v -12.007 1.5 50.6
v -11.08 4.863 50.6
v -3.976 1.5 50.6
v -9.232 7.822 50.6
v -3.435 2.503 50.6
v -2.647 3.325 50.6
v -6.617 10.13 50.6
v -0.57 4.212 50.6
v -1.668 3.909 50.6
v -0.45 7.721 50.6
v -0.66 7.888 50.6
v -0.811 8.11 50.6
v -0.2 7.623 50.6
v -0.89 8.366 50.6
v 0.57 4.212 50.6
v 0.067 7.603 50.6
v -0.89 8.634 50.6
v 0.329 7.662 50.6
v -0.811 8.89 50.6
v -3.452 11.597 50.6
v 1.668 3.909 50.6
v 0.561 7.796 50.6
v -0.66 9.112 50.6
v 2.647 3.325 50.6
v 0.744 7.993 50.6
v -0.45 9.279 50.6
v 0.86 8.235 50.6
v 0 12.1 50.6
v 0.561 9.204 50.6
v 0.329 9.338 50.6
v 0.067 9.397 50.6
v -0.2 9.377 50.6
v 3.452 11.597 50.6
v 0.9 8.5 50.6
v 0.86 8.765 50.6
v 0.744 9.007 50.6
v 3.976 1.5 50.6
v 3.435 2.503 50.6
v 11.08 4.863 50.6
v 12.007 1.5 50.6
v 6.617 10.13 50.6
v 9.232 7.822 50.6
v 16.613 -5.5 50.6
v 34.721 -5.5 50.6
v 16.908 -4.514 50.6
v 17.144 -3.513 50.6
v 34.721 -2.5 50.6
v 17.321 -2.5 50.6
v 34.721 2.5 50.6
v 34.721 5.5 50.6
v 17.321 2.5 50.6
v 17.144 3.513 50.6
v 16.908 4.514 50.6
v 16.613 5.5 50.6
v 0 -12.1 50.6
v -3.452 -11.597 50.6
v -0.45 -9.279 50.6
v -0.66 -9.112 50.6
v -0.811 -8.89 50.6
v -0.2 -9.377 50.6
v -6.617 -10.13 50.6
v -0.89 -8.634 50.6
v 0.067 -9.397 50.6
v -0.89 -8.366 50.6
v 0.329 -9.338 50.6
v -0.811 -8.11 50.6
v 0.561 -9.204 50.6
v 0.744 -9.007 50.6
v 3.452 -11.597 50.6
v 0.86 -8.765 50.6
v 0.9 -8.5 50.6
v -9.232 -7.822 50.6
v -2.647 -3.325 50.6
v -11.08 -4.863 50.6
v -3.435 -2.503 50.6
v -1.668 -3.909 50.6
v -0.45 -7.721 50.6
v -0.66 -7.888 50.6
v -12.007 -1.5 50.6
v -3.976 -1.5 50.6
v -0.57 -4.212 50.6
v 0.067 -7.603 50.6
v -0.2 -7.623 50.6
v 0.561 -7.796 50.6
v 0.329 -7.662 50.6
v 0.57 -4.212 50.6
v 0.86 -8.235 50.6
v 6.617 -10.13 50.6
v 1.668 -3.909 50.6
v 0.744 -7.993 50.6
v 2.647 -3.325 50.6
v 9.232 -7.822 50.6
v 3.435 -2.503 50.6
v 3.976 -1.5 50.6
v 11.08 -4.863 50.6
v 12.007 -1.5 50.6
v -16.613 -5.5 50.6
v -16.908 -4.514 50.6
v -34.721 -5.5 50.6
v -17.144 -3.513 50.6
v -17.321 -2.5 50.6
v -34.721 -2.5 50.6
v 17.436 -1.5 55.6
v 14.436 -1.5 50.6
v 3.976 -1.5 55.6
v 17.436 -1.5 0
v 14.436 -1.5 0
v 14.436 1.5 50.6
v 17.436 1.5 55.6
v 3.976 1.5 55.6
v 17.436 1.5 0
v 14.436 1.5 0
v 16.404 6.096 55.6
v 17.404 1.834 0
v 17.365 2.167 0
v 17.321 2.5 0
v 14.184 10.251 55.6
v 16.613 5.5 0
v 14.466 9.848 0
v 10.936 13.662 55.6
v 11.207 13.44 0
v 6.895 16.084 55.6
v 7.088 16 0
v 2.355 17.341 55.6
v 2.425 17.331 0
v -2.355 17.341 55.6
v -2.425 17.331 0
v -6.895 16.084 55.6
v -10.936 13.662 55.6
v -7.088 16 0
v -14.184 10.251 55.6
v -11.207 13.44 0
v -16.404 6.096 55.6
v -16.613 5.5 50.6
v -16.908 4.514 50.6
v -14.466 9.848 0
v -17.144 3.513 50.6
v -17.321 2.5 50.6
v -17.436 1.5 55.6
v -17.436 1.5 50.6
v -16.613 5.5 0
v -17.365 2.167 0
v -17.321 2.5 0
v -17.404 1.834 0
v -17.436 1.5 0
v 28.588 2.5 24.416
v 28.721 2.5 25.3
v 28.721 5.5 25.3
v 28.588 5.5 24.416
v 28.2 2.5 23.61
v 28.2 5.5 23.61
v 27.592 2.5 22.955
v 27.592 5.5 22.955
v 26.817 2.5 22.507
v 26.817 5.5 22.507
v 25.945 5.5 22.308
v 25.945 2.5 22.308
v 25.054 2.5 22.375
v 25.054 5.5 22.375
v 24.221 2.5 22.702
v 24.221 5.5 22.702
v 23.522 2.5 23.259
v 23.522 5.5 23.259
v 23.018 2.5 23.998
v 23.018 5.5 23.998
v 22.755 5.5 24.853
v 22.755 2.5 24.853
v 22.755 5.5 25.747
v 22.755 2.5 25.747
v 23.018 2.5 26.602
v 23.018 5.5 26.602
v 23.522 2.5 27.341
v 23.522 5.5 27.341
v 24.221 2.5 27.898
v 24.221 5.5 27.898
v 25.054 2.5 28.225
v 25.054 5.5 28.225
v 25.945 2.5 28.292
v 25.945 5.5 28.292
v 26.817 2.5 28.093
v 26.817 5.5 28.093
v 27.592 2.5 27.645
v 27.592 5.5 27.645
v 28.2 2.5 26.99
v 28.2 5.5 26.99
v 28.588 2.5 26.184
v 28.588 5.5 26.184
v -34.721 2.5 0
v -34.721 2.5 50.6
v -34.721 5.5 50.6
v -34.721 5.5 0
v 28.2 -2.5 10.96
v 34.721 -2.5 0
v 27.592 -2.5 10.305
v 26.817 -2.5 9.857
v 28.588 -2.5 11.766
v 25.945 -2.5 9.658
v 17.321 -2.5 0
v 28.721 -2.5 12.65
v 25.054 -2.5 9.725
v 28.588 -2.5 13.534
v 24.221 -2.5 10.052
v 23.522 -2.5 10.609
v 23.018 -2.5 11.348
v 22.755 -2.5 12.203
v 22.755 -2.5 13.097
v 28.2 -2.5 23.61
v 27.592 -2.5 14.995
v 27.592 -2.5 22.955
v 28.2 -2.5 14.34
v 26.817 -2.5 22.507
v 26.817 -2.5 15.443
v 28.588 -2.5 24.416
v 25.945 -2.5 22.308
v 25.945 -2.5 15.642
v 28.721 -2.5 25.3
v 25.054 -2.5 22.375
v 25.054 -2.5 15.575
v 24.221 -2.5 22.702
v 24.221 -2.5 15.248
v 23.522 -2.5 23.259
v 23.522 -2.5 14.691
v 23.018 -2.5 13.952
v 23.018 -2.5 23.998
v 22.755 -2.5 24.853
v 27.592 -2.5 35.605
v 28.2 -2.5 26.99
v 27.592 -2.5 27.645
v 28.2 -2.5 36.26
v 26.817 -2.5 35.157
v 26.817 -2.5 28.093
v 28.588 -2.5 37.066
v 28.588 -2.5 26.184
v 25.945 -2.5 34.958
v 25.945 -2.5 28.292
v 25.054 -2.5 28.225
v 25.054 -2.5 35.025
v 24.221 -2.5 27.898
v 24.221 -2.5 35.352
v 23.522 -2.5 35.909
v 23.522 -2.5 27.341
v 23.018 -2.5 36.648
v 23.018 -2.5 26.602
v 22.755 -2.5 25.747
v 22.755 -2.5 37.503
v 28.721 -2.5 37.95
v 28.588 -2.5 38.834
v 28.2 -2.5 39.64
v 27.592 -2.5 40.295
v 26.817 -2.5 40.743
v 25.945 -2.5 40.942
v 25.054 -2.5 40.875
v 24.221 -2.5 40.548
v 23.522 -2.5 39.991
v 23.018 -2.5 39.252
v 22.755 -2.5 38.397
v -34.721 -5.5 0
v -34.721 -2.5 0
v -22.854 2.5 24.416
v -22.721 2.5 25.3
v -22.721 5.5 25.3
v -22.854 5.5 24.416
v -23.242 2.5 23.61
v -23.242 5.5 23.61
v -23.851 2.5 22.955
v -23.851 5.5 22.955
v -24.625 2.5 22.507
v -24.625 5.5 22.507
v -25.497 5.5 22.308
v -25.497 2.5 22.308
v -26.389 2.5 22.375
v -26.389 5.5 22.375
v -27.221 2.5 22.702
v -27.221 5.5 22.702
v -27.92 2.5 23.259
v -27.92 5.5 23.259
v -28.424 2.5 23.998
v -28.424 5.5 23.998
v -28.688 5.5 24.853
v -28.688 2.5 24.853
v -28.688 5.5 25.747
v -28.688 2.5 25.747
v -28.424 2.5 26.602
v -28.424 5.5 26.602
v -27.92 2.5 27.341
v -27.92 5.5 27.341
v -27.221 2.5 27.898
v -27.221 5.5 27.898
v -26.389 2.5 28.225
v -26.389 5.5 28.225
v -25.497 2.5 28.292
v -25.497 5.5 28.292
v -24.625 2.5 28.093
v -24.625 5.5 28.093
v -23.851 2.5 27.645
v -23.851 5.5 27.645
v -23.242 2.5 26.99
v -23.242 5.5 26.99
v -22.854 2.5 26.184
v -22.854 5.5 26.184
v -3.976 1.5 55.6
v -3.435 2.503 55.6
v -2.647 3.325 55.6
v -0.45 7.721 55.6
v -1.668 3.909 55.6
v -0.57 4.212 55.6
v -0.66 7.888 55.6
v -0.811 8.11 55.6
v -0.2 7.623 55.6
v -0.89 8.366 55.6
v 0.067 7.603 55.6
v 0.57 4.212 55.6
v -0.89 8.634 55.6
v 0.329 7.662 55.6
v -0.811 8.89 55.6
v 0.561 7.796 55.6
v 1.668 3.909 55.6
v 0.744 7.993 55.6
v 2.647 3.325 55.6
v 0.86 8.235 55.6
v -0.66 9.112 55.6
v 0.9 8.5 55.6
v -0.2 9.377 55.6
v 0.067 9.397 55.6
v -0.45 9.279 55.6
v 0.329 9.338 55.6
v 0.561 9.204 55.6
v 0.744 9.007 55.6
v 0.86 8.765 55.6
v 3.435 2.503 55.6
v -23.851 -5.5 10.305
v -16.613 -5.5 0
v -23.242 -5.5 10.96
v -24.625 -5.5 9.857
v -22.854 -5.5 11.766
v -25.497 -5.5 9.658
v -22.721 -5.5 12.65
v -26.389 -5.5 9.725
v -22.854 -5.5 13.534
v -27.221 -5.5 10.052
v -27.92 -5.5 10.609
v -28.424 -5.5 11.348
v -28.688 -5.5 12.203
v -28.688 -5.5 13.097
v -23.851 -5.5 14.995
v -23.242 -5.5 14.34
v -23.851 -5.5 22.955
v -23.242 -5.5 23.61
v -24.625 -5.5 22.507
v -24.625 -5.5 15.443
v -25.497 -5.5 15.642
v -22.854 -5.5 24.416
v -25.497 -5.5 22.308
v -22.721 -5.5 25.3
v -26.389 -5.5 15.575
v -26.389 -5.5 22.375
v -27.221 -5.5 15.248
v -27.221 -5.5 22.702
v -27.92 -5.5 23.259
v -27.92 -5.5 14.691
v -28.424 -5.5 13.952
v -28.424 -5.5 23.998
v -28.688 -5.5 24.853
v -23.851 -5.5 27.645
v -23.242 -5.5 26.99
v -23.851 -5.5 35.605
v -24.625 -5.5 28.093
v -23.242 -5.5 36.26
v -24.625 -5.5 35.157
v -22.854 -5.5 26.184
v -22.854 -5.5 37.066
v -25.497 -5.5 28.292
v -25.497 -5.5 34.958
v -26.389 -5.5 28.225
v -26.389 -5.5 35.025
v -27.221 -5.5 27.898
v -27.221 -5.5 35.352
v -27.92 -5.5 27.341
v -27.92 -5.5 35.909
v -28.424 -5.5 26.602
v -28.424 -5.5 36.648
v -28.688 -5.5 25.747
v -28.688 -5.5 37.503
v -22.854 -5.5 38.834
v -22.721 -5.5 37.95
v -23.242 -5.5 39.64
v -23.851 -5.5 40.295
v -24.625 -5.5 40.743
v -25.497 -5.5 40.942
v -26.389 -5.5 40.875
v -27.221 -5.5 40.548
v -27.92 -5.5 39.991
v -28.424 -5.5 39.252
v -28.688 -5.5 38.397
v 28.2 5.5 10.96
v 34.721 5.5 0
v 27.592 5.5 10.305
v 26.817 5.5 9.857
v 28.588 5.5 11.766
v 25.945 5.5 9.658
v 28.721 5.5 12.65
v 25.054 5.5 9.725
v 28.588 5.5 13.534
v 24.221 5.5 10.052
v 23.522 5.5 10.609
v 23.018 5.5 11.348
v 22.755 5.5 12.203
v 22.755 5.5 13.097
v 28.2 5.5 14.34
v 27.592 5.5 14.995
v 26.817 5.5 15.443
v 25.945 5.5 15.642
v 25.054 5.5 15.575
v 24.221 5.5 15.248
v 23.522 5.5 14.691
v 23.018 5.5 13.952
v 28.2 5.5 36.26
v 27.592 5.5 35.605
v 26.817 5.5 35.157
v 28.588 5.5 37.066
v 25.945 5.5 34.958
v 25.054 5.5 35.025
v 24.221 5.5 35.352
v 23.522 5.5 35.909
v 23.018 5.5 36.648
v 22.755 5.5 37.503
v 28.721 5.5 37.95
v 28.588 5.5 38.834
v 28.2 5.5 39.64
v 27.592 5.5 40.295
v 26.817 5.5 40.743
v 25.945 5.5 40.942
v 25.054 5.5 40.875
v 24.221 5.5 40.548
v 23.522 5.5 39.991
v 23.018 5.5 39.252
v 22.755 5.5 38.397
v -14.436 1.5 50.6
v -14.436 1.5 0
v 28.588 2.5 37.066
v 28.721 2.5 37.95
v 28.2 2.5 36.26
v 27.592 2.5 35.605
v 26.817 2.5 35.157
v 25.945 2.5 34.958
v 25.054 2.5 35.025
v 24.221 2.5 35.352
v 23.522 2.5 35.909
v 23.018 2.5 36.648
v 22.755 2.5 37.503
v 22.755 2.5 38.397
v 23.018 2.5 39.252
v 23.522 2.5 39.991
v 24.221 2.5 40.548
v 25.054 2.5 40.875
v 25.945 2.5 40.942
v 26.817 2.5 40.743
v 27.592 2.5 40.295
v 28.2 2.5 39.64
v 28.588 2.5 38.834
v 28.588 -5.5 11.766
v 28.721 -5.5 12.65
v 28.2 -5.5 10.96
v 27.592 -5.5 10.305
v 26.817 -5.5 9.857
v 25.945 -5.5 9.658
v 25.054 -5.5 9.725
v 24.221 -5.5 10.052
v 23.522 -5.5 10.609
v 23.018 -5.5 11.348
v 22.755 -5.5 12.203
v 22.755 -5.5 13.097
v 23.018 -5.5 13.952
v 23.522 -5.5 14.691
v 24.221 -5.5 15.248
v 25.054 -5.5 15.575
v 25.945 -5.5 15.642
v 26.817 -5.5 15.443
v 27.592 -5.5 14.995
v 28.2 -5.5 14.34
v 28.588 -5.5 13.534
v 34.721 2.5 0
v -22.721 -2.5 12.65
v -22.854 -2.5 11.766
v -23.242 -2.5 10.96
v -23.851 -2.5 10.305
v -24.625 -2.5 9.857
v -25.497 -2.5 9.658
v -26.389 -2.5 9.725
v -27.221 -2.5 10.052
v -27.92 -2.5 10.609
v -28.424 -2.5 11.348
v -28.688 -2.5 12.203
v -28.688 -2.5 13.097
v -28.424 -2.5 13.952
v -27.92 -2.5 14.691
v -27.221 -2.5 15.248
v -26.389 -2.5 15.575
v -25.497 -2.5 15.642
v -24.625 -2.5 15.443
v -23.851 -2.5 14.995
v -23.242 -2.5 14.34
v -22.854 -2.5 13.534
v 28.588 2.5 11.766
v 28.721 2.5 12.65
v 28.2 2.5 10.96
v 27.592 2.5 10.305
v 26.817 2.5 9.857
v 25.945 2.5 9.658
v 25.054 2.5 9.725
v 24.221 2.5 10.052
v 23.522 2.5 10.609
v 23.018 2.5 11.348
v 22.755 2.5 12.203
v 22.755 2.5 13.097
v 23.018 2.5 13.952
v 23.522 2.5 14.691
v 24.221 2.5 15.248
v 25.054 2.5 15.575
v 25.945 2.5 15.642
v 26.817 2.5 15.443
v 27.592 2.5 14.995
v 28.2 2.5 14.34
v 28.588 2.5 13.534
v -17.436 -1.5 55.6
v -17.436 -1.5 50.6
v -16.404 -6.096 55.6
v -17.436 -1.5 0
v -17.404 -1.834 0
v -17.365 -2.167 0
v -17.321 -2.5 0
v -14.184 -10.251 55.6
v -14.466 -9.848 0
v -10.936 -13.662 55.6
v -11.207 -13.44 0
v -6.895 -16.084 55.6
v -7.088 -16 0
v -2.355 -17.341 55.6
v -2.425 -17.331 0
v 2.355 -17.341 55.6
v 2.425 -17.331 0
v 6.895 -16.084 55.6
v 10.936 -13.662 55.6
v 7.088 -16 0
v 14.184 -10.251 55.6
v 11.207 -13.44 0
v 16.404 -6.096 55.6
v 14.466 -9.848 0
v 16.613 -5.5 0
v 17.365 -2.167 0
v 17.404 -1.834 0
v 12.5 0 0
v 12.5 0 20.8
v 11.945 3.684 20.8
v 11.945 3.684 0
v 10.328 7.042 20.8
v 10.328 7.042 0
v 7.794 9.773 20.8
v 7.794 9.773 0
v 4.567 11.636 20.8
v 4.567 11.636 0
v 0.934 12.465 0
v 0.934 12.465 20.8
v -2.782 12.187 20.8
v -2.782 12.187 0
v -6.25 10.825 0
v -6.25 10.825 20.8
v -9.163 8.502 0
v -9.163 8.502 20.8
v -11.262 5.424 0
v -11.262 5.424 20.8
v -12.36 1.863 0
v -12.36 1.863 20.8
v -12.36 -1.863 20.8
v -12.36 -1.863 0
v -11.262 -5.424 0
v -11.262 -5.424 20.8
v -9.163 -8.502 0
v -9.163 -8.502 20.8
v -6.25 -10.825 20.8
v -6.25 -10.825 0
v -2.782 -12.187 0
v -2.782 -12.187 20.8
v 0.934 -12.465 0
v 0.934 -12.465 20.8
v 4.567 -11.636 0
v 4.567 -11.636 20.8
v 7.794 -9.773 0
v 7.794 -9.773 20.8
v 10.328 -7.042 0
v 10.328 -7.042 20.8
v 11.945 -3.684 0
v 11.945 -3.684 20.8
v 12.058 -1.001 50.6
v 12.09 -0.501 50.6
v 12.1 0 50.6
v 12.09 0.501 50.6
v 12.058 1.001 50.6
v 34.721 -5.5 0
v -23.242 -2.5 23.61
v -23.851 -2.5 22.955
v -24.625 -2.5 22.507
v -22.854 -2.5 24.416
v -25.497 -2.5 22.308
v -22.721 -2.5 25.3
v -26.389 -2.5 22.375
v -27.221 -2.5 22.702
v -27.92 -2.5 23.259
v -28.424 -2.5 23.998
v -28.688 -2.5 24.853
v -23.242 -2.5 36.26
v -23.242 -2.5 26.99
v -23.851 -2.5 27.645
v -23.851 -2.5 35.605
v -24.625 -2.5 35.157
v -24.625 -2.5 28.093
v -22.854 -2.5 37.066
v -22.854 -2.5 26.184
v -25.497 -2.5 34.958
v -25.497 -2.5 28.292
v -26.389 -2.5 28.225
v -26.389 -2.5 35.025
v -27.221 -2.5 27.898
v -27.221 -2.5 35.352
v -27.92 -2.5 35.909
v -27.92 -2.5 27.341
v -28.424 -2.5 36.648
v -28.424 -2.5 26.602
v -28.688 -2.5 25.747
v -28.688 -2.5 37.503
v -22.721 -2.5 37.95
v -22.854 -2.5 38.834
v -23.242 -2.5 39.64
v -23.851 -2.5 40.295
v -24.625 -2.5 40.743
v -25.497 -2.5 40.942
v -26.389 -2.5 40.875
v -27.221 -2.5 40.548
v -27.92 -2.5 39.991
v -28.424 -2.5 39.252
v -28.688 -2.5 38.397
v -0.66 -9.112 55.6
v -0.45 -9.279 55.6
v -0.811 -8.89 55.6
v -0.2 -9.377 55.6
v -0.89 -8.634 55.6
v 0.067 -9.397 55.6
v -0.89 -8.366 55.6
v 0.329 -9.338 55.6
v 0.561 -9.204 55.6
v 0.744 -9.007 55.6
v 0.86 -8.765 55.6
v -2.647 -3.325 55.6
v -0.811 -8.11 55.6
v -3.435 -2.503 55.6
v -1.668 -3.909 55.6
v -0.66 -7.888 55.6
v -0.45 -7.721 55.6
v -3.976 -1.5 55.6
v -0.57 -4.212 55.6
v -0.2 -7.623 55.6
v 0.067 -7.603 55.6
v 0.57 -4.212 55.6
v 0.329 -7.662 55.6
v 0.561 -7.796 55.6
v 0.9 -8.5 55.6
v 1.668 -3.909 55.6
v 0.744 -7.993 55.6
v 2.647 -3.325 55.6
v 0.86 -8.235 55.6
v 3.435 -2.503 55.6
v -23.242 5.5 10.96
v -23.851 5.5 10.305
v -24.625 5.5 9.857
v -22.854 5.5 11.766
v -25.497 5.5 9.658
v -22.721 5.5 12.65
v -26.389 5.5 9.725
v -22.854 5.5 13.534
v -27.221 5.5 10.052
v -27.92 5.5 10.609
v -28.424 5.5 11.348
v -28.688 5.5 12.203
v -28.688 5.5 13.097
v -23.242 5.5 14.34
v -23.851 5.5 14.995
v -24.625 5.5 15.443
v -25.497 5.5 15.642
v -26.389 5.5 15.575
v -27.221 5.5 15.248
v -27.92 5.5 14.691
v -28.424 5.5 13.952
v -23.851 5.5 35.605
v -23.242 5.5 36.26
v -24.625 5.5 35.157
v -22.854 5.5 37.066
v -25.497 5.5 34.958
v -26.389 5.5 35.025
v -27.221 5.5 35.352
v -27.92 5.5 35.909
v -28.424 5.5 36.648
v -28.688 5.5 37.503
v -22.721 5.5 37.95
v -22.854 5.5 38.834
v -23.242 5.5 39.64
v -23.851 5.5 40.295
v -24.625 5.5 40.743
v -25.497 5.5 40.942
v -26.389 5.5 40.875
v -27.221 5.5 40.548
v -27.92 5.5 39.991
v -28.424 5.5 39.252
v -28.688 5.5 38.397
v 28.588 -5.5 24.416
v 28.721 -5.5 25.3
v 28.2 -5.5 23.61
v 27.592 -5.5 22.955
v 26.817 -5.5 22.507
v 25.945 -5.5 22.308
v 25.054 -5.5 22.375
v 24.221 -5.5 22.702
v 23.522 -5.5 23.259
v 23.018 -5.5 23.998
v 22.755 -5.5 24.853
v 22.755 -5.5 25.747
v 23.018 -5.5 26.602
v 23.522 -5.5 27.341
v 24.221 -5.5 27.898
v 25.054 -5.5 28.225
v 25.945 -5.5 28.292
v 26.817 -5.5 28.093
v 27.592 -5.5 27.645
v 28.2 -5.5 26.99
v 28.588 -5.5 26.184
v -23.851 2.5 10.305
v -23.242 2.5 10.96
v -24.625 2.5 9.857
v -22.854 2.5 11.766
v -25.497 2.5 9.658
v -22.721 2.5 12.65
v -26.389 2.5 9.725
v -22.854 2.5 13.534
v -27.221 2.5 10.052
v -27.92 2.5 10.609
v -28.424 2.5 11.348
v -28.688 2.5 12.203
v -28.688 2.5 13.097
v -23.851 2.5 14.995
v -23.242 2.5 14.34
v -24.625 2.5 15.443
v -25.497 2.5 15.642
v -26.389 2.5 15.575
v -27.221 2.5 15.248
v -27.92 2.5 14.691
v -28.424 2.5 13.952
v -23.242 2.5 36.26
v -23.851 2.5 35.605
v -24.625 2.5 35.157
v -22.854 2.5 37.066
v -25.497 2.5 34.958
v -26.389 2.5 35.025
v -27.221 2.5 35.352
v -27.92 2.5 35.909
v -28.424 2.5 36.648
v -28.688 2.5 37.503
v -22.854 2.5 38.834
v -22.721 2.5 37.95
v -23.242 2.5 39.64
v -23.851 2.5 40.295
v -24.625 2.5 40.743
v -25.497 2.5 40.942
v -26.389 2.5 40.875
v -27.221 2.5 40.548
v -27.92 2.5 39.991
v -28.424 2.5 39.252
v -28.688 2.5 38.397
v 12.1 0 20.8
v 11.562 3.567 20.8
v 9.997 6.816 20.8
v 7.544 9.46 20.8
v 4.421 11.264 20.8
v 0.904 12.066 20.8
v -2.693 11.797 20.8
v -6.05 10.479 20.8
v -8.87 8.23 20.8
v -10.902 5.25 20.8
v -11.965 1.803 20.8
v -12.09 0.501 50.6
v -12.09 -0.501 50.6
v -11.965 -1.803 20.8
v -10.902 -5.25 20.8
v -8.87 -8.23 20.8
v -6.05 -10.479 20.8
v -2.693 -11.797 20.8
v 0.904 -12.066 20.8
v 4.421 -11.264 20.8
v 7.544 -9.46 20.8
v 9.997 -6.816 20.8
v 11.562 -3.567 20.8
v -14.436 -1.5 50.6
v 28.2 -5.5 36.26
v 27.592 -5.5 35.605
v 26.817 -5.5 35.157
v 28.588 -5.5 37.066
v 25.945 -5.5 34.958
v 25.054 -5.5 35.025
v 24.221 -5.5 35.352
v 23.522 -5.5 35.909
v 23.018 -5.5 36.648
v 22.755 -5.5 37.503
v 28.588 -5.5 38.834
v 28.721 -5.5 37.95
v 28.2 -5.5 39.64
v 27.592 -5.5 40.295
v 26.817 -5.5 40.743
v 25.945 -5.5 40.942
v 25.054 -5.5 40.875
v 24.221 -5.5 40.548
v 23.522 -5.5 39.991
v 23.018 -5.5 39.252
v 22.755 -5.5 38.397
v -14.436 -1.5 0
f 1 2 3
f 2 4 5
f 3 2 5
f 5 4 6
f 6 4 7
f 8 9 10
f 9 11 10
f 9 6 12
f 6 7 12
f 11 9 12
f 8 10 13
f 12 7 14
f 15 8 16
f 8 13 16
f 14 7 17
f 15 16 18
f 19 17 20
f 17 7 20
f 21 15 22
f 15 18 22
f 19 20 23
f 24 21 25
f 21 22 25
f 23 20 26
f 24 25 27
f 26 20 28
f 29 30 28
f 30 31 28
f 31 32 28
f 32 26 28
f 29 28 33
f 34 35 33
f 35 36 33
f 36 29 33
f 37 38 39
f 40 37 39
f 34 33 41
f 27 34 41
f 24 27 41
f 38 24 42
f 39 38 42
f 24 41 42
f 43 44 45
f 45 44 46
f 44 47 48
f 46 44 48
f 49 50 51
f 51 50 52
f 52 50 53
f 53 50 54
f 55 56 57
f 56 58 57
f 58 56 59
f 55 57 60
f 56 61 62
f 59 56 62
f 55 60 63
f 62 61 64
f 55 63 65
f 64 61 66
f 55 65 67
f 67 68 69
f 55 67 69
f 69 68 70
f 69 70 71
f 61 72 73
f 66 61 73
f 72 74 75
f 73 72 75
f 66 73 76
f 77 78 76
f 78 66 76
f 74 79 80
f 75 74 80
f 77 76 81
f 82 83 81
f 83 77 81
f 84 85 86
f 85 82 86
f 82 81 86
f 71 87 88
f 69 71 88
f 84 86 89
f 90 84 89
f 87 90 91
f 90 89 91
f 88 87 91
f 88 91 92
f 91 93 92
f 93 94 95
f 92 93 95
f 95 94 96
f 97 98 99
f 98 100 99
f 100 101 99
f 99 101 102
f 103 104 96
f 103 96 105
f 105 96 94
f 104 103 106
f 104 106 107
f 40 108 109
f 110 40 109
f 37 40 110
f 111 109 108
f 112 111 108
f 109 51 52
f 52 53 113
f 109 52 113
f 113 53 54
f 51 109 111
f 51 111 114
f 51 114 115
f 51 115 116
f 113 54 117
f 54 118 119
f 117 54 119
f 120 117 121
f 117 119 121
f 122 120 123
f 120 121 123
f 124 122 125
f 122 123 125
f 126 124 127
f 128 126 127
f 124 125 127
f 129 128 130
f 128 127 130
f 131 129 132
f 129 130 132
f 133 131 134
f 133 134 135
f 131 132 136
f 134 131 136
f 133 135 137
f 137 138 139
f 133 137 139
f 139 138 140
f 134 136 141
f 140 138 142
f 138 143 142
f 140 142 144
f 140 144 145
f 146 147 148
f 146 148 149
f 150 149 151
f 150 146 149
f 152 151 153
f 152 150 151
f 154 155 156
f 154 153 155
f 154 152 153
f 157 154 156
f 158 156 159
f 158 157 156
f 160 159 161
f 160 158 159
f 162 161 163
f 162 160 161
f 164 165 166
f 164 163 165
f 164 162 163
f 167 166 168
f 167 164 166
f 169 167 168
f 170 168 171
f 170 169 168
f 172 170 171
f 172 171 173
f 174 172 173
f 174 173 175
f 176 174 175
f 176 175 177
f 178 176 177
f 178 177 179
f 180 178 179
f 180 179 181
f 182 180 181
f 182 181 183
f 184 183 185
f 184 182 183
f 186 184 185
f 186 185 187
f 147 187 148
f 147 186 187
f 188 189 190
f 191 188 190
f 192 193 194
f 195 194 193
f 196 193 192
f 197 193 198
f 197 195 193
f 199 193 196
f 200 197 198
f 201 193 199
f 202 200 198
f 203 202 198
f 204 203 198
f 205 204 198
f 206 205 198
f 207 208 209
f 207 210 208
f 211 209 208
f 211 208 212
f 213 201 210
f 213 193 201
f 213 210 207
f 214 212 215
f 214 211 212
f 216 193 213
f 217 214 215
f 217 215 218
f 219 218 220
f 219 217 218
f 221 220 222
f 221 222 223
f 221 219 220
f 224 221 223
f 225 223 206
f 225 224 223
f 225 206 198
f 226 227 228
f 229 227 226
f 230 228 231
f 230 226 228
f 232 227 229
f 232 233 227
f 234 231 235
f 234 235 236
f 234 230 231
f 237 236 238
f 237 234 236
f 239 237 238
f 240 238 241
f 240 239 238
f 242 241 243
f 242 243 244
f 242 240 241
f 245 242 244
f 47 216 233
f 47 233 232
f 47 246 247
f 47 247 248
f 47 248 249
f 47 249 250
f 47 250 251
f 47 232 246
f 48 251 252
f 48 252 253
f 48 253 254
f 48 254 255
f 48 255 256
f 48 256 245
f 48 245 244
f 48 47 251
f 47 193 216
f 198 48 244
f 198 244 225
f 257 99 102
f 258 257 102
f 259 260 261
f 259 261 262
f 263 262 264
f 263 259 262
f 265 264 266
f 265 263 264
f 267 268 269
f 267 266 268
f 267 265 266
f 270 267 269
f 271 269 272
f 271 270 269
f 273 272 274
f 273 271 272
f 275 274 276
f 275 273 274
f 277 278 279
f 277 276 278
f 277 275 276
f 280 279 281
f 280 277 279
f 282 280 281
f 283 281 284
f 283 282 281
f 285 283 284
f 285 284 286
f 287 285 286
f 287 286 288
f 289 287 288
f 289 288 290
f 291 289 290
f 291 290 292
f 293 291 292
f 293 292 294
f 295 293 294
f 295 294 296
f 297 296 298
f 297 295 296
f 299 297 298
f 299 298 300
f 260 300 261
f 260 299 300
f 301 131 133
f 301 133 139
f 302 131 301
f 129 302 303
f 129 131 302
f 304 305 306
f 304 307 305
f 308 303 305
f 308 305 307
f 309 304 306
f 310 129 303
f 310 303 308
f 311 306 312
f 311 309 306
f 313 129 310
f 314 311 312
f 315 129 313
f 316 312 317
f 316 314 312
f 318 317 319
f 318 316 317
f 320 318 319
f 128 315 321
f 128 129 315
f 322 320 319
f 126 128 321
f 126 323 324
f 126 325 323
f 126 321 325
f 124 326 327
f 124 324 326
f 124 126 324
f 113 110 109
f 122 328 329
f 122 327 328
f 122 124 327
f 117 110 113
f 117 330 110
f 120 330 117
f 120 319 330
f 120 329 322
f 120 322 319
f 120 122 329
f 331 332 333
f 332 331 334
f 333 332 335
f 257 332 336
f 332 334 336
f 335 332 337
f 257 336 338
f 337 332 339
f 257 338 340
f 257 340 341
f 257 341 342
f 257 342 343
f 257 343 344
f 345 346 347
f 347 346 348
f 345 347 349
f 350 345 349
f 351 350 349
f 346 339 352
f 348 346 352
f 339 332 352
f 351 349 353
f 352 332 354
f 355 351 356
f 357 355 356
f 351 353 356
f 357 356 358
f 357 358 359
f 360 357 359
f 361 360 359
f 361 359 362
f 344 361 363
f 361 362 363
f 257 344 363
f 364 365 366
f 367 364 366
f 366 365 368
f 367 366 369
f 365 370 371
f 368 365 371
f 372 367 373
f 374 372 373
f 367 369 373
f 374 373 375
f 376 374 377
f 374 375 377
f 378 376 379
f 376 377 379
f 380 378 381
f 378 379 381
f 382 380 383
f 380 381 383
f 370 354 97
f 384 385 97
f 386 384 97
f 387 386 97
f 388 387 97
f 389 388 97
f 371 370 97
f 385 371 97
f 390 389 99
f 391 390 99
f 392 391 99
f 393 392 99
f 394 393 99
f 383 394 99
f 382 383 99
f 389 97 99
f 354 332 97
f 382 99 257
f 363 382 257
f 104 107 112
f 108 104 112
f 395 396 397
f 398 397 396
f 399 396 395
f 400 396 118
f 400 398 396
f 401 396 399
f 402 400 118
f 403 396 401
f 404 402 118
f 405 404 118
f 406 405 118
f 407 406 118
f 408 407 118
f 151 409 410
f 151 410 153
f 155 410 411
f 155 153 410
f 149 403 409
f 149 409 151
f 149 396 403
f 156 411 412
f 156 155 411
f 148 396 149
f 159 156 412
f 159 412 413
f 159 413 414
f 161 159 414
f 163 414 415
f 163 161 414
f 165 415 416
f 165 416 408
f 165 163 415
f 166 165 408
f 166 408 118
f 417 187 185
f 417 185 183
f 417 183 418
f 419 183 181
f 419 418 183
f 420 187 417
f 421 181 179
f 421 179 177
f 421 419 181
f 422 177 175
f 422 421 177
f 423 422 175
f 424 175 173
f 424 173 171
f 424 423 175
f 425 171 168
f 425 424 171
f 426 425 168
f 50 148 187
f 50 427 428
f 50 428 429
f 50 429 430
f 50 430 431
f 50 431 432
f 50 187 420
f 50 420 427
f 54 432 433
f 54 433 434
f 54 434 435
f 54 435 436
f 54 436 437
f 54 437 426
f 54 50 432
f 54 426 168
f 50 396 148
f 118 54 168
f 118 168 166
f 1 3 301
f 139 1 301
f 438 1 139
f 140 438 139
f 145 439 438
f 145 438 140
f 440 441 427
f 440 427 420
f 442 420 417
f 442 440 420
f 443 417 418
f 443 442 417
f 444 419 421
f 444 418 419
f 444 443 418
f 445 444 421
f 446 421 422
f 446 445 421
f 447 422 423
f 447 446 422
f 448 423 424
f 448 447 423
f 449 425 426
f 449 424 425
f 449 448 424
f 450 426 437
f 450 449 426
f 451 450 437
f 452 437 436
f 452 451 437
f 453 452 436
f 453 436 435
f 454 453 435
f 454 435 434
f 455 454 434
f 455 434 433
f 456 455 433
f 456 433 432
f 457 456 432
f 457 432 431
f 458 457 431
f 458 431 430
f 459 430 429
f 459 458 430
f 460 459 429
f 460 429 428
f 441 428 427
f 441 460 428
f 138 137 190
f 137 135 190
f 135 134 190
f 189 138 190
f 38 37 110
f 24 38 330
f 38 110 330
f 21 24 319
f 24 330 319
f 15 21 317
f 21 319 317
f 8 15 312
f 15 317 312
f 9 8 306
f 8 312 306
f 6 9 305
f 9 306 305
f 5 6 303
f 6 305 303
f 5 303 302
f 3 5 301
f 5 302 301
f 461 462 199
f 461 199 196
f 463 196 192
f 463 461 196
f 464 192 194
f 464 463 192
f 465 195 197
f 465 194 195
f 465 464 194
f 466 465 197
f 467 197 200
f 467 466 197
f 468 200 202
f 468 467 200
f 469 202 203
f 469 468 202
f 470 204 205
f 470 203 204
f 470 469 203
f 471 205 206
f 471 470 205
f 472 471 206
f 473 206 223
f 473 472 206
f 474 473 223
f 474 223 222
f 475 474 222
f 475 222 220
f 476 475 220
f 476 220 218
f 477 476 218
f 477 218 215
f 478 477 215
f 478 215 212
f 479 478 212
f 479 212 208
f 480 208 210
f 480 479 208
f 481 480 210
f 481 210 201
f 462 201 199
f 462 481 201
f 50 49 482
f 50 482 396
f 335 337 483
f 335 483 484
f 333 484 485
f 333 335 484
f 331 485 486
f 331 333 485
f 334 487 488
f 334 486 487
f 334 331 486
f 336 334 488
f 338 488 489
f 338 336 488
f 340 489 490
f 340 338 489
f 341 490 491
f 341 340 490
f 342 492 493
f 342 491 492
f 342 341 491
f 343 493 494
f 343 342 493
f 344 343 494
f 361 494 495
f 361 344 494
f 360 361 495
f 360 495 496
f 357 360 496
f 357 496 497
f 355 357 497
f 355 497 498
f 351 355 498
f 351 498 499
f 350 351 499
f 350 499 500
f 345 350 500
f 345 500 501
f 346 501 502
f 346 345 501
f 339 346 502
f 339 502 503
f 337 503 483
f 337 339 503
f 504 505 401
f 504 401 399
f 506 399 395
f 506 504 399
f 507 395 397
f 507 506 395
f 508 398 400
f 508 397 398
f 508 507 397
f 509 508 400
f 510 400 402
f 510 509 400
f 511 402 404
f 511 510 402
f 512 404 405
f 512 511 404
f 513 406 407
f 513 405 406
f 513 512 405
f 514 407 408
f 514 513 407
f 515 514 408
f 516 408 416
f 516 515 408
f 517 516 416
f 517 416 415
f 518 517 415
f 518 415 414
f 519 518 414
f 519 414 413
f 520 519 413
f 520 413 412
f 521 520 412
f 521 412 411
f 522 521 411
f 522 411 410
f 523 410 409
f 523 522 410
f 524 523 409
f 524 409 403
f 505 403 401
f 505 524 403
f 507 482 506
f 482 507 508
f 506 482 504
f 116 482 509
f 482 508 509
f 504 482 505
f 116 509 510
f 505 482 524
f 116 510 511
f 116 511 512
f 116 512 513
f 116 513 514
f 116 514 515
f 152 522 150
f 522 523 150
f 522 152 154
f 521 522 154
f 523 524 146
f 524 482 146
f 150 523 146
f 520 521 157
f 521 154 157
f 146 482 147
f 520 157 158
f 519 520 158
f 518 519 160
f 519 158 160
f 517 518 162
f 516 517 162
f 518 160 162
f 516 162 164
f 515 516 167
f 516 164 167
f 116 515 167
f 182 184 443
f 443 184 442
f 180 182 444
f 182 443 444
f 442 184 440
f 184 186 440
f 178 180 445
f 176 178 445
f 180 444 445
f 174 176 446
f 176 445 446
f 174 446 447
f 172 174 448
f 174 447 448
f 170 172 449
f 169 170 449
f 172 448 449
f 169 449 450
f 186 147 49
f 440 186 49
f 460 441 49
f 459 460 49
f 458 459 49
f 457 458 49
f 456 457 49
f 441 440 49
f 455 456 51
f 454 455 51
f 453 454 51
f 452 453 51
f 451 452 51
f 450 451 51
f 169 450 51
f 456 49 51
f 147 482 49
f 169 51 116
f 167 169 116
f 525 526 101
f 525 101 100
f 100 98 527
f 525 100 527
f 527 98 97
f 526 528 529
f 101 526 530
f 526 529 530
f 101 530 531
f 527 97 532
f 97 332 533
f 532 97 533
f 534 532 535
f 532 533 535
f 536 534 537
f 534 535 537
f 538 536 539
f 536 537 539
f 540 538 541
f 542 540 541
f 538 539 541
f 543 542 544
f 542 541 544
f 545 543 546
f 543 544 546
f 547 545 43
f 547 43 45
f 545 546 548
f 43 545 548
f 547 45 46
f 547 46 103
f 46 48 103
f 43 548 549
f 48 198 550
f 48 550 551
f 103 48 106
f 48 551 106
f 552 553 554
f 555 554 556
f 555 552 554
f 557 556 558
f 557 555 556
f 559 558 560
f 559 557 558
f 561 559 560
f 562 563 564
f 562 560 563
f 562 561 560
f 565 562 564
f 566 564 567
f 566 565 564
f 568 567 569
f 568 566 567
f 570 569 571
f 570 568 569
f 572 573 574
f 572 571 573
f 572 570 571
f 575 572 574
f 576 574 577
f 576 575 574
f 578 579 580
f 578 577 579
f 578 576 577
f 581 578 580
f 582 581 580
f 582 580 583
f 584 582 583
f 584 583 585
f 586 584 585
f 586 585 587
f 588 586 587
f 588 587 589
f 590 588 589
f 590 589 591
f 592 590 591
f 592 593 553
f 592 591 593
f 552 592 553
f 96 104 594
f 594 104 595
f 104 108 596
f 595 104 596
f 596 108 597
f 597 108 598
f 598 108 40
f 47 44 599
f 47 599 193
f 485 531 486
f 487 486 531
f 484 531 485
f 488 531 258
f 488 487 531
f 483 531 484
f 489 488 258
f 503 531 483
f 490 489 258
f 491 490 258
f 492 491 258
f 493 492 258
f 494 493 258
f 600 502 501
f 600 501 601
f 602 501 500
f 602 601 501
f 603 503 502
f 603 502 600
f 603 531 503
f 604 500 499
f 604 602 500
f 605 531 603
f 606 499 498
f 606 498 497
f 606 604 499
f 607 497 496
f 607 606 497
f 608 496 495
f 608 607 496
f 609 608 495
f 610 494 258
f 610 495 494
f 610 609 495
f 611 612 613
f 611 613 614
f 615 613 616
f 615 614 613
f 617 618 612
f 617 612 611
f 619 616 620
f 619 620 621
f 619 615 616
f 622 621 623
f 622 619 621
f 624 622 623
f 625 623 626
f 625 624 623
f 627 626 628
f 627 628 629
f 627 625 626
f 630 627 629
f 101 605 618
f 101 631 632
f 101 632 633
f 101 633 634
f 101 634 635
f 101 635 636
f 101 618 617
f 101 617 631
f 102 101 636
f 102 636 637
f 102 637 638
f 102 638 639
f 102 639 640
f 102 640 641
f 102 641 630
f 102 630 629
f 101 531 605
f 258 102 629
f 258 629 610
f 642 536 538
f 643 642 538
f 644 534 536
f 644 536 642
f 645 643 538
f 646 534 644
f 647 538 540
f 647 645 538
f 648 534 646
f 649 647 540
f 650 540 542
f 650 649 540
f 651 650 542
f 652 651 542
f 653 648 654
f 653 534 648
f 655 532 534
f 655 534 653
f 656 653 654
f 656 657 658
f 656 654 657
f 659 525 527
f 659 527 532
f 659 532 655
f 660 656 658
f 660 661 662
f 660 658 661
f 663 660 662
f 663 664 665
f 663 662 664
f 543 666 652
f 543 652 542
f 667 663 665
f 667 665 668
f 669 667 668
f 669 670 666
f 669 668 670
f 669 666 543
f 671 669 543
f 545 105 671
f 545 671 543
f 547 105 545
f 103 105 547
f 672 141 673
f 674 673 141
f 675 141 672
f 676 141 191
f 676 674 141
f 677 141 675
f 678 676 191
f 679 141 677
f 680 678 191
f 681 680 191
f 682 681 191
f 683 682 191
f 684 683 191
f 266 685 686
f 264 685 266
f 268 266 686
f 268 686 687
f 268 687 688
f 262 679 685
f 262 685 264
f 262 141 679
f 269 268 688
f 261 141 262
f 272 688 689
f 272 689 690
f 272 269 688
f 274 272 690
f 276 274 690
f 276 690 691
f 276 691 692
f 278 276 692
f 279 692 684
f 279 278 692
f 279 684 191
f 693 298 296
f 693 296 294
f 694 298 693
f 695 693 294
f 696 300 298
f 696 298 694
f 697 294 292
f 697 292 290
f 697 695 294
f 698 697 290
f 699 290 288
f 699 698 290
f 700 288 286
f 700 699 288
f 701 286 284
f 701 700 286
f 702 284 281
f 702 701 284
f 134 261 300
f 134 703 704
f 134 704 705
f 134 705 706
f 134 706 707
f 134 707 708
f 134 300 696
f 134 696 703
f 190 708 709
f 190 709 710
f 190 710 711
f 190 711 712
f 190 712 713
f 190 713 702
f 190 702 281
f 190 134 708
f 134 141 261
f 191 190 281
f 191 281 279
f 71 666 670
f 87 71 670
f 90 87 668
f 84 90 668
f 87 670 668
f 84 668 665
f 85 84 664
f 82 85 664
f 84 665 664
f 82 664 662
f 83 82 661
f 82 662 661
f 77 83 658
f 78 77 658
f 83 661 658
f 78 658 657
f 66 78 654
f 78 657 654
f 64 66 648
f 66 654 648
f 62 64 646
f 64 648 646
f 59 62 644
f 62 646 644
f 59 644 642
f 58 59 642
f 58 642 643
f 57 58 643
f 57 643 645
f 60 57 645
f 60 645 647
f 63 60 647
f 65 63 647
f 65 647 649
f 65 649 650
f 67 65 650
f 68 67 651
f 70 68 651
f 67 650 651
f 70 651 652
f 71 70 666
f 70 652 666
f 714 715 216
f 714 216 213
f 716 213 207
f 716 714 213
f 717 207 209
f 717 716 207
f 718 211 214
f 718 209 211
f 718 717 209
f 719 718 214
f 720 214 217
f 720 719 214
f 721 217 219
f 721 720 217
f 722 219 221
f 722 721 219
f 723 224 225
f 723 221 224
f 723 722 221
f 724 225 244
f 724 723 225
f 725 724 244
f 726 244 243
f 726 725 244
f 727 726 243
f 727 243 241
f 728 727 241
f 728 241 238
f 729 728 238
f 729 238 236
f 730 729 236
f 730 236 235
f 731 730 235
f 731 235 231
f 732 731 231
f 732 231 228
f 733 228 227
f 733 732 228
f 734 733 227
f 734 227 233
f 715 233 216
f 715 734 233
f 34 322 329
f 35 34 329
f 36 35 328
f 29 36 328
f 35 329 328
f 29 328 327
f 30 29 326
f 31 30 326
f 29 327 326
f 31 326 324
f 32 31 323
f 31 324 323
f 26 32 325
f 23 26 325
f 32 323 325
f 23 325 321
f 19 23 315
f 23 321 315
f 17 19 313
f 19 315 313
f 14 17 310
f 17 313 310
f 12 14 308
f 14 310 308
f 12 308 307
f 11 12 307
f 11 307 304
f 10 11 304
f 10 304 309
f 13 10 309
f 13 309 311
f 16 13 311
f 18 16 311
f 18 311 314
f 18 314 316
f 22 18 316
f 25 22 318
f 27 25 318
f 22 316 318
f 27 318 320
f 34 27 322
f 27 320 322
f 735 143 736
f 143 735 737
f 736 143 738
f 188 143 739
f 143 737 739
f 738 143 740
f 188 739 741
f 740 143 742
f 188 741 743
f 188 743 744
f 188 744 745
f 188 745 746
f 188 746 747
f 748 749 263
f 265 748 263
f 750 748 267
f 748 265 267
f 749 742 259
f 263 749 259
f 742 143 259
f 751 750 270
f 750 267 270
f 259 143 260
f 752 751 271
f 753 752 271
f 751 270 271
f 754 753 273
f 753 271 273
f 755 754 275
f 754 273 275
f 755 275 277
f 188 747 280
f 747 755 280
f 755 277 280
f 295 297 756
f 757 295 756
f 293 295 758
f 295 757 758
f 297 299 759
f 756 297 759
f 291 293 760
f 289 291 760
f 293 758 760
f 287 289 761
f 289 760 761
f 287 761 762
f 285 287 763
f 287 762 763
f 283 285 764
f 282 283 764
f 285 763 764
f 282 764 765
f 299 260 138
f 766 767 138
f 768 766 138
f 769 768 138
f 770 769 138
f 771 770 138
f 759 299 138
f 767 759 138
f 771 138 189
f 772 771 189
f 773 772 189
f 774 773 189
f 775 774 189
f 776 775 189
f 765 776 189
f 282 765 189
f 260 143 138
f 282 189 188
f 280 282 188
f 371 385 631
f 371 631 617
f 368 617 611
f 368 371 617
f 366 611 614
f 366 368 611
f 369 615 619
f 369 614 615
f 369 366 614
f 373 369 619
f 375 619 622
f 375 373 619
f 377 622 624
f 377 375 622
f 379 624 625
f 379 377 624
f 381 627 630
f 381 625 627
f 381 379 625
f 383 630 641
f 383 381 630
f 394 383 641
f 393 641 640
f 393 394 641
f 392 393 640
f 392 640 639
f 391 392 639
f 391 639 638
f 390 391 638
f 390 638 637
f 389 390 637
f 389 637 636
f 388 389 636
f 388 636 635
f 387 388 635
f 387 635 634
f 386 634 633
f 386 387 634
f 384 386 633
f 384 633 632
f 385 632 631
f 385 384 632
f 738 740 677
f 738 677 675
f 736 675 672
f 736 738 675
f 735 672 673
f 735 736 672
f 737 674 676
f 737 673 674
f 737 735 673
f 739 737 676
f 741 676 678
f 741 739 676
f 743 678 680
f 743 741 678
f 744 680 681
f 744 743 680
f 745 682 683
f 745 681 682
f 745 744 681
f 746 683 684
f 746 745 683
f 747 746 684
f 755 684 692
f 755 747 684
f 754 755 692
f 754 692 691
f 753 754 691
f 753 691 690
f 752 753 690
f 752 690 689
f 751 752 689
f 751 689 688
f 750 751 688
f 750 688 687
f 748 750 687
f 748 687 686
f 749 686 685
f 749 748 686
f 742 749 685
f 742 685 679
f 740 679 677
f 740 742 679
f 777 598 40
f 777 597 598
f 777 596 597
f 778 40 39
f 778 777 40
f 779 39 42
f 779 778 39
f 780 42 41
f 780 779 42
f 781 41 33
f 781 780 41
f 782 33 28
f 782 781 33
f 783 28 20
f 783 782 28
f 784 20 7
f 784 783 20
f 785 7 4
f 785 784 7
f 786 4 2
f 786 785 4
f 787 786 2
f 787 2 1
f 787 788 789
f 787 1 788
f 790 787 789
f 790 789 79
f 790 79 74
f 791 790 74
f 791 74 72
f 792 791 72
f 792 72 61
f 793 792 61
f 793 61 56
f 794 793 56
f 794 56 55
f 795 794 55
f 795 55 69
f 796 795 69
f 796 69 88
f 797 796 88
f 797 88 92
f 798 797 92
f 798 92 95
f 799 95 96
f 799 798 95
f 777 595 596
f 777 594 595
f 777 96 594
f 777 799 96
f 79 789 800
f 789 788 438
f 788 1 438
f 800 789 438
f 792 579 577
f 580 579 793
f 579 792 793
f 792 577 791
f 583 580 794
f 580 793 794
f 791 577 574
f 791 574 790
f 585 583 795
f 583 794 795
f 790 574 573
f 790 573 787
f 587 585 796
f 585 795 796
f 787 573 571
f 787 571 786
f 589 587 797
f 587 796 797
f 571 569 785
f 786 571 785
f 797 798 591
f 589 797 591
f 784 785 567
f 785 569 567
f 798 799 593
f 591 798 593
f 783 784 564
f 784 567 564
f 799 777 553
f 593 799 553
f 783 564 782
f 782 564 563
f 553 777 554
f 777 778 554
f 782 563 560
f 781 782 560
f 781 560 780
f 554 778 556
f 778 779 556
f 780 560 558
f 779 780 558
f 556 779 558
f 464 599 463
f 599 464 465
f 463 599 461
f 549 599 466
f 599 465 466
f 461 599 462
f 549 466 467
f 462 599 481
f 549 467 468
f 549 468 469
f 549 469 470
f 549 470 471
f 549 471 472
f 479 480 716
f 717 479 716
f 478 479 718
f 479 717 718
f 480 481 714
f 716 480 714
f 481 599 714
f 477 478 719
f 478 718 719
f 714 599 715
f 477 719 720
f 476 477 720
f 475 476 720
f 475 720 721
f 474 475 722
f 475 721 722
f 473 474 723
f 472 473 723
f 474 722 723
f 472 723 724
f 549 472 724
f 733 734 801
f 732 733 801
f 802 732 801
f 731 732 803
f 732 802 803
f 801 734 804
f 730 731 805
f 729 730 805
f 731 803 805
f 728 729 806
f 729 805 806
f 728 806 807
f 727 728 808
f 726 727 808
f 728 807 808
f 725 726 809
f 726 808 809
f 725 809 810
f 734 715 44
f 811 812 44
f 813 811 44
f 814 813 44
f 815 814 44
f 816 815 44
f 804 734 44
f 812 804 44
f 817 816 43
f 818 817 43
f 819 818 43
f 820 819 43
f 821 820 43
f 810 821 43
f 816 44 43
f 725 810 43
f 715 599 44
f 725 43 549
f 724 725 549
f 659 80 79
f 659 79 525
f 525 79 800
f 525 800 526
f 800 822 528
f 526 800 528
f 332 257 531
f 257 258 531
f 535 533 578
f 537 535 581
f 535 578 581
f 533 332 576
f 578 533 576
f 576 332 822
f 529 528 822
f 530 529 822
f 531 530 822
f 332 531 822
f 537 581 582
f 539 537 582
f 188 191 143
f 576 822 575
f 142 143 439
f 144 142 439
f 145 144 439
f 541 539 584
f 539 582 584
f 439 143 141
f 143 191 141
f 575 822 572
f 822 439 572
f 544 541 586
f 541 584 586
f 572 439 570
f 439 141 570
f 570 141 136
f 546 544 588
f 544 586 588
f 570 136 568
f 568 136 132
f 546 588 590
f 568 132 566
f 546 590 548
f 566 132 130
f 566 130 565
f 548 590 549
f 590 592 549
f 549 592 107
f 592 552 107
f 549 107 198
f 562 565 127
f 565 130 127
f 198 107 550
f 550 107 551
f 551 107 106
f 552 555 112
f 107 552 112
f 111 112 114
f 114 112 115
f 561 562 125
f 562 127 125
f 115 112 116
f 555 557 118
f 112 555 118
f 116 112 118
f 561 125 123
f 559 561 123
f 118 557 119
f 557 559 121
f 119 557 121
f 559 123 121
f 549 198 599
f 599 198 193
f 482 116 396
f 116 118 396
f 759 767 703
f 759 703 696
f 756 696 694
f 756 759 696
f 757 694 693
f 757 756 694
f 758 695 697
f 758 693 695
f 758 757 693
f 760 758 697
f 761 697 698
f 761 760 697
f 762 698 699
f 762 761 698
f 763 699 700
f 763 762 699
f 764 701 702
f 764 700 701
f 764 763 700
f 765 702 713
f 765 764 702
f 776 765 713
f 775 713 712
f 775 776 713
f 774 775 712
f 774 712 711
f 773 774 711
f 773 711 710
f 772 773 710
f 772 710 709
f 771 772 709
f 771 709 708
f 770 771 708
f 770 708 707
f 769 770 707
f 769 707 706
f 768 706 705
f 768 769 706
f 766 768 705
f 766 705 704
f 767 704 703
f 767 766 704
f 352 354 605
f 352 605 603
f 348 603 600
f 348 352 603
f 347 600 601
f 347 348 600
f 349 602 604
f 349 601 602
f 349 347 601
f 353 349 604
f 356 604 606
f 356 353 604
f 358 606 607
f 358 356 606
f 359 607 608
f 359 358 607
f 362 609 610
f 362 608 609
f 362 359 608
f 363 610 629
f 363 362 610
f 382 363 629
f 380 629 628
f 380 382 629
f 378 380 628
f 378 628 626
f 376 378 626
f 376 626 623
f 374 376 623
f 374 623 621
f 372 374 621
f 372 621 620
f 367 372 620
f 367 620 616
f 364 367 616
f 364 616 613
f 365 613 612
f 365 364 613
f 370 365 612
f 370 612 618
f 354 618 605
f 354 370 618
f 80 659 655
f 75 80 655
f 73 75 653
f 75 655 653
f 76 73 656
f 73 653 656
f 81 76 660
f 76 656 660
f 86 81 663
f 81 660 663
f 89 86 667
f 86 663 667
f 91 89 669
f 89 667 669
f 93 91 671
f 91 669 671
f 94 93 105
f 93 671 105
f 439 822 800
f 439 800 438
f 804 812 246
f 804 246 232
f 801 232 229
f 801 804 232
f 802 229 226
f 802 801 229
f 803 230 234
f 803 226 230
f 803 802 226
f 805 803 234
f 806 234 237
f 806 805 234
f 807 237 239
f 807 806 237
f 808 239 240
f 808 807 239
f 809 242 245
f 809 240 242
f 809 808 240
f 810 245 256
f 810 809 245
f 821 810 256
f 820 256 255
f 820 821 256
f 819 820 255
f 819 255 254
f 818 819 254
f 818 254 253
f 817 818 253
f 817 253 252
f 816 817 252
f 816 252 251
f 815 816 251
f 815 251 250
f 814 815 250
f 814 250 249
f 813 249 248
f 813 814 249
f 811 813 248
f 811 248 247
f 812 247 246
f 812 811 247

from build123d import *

# Parameters (mm, degrees)
ESBO_O1_R                  = 17.5
ESBO_O1_R_2                = 12.5
RESSALTO_EXTRUS_O1_DEPTH   = 55.6
RESSALTO_EXTRUS_O2_START   = -5
ESBO_O2_R                  = 12.5
RESSALTO_EXTRUS_O2_DEPTH   = 5
RESSALTO_EXTRUS_O3_START   = -34.8
ESBO_O4_R                  = 17.5
ESBO_O4_R_2                = 12.1
RESSALTO_EXTRUS_O3_DEPTH   = 34.8
CORTE_EXTRUS_O4_START      = -5
CORTE_EXTRUS_O4_DEPTH      = 5
ESBO_O13_R                 = 2
CORTE_EXTRUS_O6_DEPTH      = 78
ESBO_O14_W                 = 20
ESBO_O14_H                 = 3
RESSALTO_EXTRUS_O5_DEPTH   = 50.6
CORTE_EXTRUS_O7_DEPTH      = 50.6
CORTE_EXTRUS_O7_DEPTH_BACK = 50.6
ESBO_O15_R                 = 3
ESBO_O19_W                 = 3.249347661
ESBO_O19_H                 = 3
ESBO_O19_W_2               = 1.024720198
CORTE_EXTRUS_O8_DEPTH      = 78
ESBO_O24_W                 = 3
ESBO_O24_H                 = 3
CORTE_EXTRUS_O9_DEPTH      = 78
ESBO_O27_R                 = 4.25
CORTE_EXTRUS_O10_DEPTH     = 10
RESSALTO_EXTRUS_O6_START   = -5
ESBO_O28_R                 = 2
RESSALTO_EXTRUS_O6_DEPTH   = 5
ESBO_O29_R                 = 0.9
CORTE_EXTRUS_O11_DEPTH     = 5


with BuildPart() as part:
    # Esboço1 → Ressalto-extrusão1 (new body)
    with BuildSketch(Plane.XY):
        Circle(ESBO_O1_R)
        Circle(ESBO_O1_R_2, mode=Mode.SUBTRACT)
    extrude(amount=RESSALTO_EXTRUS_O1_DEPTH)

    # Esboço2 → Ressalto-extrusão2 (add)
    with BuildSketch(Plane.XY.offset(55.6).offset(RESSALTO_EXTRUS_O2_START)):
        Circle(ESBO_O2_R)
    extrude(amount=RESSALTO_EXTRUS_O2_DEPTH)

    # Esboço4 → Ressalto-extrusão3 (add)
    with BuildSketch(Plane.XY.offset(55.6).offset(RESSALTO_EXTRUS_O3_START)):
        Circle(ESBO_O4_R)
        Circle(ESBO_O4_R_2, mode=Mode.SUBTRACT)
    extrude(amount=RESSALTO_EXTRUS_O3_DEPTH)

    # Esboço12 → Corte-extrusão4 (cut)
    with BuildSketch(Plane.XY.offset(55.6).offset(CORTE_EXTRUS_O4_START)):
        with BuildLine():
            Line((0, 1.5), (17.435595774, 1.5))
            ThreePointArc((17.435595774, 1.5), (17.5, 0), (17.435595774, -1.5))
            Line((17.435595774, -1.5), (0, -1.5))
            Line((0, -1.5), (-17.435595774, -1.5))
            ThreePointArc((-17.435595774, -1.5), (-17.5, 0), (-17.435595774, 1.5))
            Line((-17.435595774, 1.5), (0, 1.5))
        make_face()
    extrude(amount=CORTE_EXTRUS_O4_DEPTH, mode=Mode.SUBTRACT)

    # Esboço13 → Corte-extrusão6 (cut)
    with BuildSketch(Plane.XY):
        with Locations((0, -7.714268488)):
            Circle(ESBO_O13_R)
    extrude(amount=CORTE_EXTRUS_O6_DEPTH, mode=Mode.SUBTRACT)

    # Esboço14 → Ressalto-extrusão5 (add)
    with BuildSketch(Plane(origin=(0, 0, 50.6), x_dir=(-1, 0, 0), z_dir=(0, 0, -1))):
        with Locations((24.721130295, -4)):
            Rectangle(ESBO_O14_W, ESBO_O14_H)
        with Locations((24.721130295, 4)):
            Rectangle(ESBO_O14_W, ESBO_O14_H)
        with Locations((-24.721130295, 4)):
            Rectangle(ESBO_O14_W, ESBO_O14_H)
        with Locations((-24.721130295, -4)):
            Rectangle(ESBO_O14_W, ESBO_O14_H)
    extrude(amount=RESSALTO_EXTRUS_O5_DEPTH)

    # Esboço15 → Corte-extrusão7 (cut, two sides: drawn at the far end of the back side and taken through both)
    with BuildSketch(Plane(origin=(0, 0, 0), x_dir=(1, 0, 0), z_dir=(0, 1, 0)).offset(-CORTE_EXTRUS_O7_DEPTH_BACK)):
        with Locations((-25.721130295, -25.3)):
            Circle(ESBO_O15_R)
        with Locations((25.721130295, -25.3)):
            Circle(ESBO_O15_R)
        with Locations((-25.721130295, -37.95)):
            Circle(ESBO_O15_R)
        with Locations((-25.721130295, -12.65)):
            Circle(ESBO_O15_R)
        with Locations((25.721130295, -12.65)):
            Circle(ESBO_O15_R)
        with Locations((25.721130295, -37.95)):
            Circle(ESBO_O15_R)
    extrude(amount=CORTE_EXTRUS_O7_DEPTH + CORTE_EXTRUS_O7_DEPTH_BACK, mode=Mode.SUBTRACT)

    # Esboço19 → Corte-extrusão8 (cut)
    with BuildSketch(Plane(origin=(0, 0, 50.6), x_dir=(-1, 0, 0), z_dir=(0, 0, -1))):
        with Locations((19.060269605, 0)):
            Rectangle(ESBO_O19_W, ESBO_O19_H)
        with Locations((-17.947955873, 0)):
            Rectangle(ESBO_O19_W_2, ESBO_O19_H)
    extrude(amount=CORTE_EXTRUS_O8_DEPTH, mode=Mode.SUBTRACT)

    # Esboço24 → Corte-extrusão9 (cut)
    with BuildSketch(Plane(origin=(0, 0, 0), x_dir=(-1, 0, 0), z_dir=(0, 0, -1))):
        with Locations((-15.935595774, 0)):
            Rectangle(ESBO_O24_W, ESBO_O24_H)
        with Locations((15.935595774, 0)):
            Rectangle(ESBO_O24_W, ESBO_O24_H)
    extrude(amount=-CORTE_EXTRUS_O9_DEPTH, mode=Mode.SUBTRACT)

    # Esboço27 → Corte-extrusão10 (cut)
    with BuildSketch(Plane.XY.offset(55.6)):
        Circle(ESBO_O27_R)
    extrude(amount=-CORTE_EXTRUS_O10_DEPTH, mode=Mode.SUBTRACT)

    # Esboço28 → Ressalto-extrusão6 (add)
    with BuildSketch(Plane.XY.offset(55.6).offset(RESSALTO_EXTRUS_O6_START)):
        with Locations((0, -7.714268488)):
            Circle(ESBO_O28_R)
    extrude(amount=RESSALTO_EXTRUS_O6_DEPTH)

    # Esboço29 → Corte-extrusão11 (cut)
    with BuildSketch(Plane.XY.offset(55.6)):
        with Locations((0, 8.5)):
            Circle(ESBO_O29_R)
        with Locations((0, -8.5)):
            Circle(ESBO_O29_R)
    extrude(amount=-CORTE_EXTRUS_O11_DEPTH, mode=Mode.SUBTRACT)


solid = part.part
